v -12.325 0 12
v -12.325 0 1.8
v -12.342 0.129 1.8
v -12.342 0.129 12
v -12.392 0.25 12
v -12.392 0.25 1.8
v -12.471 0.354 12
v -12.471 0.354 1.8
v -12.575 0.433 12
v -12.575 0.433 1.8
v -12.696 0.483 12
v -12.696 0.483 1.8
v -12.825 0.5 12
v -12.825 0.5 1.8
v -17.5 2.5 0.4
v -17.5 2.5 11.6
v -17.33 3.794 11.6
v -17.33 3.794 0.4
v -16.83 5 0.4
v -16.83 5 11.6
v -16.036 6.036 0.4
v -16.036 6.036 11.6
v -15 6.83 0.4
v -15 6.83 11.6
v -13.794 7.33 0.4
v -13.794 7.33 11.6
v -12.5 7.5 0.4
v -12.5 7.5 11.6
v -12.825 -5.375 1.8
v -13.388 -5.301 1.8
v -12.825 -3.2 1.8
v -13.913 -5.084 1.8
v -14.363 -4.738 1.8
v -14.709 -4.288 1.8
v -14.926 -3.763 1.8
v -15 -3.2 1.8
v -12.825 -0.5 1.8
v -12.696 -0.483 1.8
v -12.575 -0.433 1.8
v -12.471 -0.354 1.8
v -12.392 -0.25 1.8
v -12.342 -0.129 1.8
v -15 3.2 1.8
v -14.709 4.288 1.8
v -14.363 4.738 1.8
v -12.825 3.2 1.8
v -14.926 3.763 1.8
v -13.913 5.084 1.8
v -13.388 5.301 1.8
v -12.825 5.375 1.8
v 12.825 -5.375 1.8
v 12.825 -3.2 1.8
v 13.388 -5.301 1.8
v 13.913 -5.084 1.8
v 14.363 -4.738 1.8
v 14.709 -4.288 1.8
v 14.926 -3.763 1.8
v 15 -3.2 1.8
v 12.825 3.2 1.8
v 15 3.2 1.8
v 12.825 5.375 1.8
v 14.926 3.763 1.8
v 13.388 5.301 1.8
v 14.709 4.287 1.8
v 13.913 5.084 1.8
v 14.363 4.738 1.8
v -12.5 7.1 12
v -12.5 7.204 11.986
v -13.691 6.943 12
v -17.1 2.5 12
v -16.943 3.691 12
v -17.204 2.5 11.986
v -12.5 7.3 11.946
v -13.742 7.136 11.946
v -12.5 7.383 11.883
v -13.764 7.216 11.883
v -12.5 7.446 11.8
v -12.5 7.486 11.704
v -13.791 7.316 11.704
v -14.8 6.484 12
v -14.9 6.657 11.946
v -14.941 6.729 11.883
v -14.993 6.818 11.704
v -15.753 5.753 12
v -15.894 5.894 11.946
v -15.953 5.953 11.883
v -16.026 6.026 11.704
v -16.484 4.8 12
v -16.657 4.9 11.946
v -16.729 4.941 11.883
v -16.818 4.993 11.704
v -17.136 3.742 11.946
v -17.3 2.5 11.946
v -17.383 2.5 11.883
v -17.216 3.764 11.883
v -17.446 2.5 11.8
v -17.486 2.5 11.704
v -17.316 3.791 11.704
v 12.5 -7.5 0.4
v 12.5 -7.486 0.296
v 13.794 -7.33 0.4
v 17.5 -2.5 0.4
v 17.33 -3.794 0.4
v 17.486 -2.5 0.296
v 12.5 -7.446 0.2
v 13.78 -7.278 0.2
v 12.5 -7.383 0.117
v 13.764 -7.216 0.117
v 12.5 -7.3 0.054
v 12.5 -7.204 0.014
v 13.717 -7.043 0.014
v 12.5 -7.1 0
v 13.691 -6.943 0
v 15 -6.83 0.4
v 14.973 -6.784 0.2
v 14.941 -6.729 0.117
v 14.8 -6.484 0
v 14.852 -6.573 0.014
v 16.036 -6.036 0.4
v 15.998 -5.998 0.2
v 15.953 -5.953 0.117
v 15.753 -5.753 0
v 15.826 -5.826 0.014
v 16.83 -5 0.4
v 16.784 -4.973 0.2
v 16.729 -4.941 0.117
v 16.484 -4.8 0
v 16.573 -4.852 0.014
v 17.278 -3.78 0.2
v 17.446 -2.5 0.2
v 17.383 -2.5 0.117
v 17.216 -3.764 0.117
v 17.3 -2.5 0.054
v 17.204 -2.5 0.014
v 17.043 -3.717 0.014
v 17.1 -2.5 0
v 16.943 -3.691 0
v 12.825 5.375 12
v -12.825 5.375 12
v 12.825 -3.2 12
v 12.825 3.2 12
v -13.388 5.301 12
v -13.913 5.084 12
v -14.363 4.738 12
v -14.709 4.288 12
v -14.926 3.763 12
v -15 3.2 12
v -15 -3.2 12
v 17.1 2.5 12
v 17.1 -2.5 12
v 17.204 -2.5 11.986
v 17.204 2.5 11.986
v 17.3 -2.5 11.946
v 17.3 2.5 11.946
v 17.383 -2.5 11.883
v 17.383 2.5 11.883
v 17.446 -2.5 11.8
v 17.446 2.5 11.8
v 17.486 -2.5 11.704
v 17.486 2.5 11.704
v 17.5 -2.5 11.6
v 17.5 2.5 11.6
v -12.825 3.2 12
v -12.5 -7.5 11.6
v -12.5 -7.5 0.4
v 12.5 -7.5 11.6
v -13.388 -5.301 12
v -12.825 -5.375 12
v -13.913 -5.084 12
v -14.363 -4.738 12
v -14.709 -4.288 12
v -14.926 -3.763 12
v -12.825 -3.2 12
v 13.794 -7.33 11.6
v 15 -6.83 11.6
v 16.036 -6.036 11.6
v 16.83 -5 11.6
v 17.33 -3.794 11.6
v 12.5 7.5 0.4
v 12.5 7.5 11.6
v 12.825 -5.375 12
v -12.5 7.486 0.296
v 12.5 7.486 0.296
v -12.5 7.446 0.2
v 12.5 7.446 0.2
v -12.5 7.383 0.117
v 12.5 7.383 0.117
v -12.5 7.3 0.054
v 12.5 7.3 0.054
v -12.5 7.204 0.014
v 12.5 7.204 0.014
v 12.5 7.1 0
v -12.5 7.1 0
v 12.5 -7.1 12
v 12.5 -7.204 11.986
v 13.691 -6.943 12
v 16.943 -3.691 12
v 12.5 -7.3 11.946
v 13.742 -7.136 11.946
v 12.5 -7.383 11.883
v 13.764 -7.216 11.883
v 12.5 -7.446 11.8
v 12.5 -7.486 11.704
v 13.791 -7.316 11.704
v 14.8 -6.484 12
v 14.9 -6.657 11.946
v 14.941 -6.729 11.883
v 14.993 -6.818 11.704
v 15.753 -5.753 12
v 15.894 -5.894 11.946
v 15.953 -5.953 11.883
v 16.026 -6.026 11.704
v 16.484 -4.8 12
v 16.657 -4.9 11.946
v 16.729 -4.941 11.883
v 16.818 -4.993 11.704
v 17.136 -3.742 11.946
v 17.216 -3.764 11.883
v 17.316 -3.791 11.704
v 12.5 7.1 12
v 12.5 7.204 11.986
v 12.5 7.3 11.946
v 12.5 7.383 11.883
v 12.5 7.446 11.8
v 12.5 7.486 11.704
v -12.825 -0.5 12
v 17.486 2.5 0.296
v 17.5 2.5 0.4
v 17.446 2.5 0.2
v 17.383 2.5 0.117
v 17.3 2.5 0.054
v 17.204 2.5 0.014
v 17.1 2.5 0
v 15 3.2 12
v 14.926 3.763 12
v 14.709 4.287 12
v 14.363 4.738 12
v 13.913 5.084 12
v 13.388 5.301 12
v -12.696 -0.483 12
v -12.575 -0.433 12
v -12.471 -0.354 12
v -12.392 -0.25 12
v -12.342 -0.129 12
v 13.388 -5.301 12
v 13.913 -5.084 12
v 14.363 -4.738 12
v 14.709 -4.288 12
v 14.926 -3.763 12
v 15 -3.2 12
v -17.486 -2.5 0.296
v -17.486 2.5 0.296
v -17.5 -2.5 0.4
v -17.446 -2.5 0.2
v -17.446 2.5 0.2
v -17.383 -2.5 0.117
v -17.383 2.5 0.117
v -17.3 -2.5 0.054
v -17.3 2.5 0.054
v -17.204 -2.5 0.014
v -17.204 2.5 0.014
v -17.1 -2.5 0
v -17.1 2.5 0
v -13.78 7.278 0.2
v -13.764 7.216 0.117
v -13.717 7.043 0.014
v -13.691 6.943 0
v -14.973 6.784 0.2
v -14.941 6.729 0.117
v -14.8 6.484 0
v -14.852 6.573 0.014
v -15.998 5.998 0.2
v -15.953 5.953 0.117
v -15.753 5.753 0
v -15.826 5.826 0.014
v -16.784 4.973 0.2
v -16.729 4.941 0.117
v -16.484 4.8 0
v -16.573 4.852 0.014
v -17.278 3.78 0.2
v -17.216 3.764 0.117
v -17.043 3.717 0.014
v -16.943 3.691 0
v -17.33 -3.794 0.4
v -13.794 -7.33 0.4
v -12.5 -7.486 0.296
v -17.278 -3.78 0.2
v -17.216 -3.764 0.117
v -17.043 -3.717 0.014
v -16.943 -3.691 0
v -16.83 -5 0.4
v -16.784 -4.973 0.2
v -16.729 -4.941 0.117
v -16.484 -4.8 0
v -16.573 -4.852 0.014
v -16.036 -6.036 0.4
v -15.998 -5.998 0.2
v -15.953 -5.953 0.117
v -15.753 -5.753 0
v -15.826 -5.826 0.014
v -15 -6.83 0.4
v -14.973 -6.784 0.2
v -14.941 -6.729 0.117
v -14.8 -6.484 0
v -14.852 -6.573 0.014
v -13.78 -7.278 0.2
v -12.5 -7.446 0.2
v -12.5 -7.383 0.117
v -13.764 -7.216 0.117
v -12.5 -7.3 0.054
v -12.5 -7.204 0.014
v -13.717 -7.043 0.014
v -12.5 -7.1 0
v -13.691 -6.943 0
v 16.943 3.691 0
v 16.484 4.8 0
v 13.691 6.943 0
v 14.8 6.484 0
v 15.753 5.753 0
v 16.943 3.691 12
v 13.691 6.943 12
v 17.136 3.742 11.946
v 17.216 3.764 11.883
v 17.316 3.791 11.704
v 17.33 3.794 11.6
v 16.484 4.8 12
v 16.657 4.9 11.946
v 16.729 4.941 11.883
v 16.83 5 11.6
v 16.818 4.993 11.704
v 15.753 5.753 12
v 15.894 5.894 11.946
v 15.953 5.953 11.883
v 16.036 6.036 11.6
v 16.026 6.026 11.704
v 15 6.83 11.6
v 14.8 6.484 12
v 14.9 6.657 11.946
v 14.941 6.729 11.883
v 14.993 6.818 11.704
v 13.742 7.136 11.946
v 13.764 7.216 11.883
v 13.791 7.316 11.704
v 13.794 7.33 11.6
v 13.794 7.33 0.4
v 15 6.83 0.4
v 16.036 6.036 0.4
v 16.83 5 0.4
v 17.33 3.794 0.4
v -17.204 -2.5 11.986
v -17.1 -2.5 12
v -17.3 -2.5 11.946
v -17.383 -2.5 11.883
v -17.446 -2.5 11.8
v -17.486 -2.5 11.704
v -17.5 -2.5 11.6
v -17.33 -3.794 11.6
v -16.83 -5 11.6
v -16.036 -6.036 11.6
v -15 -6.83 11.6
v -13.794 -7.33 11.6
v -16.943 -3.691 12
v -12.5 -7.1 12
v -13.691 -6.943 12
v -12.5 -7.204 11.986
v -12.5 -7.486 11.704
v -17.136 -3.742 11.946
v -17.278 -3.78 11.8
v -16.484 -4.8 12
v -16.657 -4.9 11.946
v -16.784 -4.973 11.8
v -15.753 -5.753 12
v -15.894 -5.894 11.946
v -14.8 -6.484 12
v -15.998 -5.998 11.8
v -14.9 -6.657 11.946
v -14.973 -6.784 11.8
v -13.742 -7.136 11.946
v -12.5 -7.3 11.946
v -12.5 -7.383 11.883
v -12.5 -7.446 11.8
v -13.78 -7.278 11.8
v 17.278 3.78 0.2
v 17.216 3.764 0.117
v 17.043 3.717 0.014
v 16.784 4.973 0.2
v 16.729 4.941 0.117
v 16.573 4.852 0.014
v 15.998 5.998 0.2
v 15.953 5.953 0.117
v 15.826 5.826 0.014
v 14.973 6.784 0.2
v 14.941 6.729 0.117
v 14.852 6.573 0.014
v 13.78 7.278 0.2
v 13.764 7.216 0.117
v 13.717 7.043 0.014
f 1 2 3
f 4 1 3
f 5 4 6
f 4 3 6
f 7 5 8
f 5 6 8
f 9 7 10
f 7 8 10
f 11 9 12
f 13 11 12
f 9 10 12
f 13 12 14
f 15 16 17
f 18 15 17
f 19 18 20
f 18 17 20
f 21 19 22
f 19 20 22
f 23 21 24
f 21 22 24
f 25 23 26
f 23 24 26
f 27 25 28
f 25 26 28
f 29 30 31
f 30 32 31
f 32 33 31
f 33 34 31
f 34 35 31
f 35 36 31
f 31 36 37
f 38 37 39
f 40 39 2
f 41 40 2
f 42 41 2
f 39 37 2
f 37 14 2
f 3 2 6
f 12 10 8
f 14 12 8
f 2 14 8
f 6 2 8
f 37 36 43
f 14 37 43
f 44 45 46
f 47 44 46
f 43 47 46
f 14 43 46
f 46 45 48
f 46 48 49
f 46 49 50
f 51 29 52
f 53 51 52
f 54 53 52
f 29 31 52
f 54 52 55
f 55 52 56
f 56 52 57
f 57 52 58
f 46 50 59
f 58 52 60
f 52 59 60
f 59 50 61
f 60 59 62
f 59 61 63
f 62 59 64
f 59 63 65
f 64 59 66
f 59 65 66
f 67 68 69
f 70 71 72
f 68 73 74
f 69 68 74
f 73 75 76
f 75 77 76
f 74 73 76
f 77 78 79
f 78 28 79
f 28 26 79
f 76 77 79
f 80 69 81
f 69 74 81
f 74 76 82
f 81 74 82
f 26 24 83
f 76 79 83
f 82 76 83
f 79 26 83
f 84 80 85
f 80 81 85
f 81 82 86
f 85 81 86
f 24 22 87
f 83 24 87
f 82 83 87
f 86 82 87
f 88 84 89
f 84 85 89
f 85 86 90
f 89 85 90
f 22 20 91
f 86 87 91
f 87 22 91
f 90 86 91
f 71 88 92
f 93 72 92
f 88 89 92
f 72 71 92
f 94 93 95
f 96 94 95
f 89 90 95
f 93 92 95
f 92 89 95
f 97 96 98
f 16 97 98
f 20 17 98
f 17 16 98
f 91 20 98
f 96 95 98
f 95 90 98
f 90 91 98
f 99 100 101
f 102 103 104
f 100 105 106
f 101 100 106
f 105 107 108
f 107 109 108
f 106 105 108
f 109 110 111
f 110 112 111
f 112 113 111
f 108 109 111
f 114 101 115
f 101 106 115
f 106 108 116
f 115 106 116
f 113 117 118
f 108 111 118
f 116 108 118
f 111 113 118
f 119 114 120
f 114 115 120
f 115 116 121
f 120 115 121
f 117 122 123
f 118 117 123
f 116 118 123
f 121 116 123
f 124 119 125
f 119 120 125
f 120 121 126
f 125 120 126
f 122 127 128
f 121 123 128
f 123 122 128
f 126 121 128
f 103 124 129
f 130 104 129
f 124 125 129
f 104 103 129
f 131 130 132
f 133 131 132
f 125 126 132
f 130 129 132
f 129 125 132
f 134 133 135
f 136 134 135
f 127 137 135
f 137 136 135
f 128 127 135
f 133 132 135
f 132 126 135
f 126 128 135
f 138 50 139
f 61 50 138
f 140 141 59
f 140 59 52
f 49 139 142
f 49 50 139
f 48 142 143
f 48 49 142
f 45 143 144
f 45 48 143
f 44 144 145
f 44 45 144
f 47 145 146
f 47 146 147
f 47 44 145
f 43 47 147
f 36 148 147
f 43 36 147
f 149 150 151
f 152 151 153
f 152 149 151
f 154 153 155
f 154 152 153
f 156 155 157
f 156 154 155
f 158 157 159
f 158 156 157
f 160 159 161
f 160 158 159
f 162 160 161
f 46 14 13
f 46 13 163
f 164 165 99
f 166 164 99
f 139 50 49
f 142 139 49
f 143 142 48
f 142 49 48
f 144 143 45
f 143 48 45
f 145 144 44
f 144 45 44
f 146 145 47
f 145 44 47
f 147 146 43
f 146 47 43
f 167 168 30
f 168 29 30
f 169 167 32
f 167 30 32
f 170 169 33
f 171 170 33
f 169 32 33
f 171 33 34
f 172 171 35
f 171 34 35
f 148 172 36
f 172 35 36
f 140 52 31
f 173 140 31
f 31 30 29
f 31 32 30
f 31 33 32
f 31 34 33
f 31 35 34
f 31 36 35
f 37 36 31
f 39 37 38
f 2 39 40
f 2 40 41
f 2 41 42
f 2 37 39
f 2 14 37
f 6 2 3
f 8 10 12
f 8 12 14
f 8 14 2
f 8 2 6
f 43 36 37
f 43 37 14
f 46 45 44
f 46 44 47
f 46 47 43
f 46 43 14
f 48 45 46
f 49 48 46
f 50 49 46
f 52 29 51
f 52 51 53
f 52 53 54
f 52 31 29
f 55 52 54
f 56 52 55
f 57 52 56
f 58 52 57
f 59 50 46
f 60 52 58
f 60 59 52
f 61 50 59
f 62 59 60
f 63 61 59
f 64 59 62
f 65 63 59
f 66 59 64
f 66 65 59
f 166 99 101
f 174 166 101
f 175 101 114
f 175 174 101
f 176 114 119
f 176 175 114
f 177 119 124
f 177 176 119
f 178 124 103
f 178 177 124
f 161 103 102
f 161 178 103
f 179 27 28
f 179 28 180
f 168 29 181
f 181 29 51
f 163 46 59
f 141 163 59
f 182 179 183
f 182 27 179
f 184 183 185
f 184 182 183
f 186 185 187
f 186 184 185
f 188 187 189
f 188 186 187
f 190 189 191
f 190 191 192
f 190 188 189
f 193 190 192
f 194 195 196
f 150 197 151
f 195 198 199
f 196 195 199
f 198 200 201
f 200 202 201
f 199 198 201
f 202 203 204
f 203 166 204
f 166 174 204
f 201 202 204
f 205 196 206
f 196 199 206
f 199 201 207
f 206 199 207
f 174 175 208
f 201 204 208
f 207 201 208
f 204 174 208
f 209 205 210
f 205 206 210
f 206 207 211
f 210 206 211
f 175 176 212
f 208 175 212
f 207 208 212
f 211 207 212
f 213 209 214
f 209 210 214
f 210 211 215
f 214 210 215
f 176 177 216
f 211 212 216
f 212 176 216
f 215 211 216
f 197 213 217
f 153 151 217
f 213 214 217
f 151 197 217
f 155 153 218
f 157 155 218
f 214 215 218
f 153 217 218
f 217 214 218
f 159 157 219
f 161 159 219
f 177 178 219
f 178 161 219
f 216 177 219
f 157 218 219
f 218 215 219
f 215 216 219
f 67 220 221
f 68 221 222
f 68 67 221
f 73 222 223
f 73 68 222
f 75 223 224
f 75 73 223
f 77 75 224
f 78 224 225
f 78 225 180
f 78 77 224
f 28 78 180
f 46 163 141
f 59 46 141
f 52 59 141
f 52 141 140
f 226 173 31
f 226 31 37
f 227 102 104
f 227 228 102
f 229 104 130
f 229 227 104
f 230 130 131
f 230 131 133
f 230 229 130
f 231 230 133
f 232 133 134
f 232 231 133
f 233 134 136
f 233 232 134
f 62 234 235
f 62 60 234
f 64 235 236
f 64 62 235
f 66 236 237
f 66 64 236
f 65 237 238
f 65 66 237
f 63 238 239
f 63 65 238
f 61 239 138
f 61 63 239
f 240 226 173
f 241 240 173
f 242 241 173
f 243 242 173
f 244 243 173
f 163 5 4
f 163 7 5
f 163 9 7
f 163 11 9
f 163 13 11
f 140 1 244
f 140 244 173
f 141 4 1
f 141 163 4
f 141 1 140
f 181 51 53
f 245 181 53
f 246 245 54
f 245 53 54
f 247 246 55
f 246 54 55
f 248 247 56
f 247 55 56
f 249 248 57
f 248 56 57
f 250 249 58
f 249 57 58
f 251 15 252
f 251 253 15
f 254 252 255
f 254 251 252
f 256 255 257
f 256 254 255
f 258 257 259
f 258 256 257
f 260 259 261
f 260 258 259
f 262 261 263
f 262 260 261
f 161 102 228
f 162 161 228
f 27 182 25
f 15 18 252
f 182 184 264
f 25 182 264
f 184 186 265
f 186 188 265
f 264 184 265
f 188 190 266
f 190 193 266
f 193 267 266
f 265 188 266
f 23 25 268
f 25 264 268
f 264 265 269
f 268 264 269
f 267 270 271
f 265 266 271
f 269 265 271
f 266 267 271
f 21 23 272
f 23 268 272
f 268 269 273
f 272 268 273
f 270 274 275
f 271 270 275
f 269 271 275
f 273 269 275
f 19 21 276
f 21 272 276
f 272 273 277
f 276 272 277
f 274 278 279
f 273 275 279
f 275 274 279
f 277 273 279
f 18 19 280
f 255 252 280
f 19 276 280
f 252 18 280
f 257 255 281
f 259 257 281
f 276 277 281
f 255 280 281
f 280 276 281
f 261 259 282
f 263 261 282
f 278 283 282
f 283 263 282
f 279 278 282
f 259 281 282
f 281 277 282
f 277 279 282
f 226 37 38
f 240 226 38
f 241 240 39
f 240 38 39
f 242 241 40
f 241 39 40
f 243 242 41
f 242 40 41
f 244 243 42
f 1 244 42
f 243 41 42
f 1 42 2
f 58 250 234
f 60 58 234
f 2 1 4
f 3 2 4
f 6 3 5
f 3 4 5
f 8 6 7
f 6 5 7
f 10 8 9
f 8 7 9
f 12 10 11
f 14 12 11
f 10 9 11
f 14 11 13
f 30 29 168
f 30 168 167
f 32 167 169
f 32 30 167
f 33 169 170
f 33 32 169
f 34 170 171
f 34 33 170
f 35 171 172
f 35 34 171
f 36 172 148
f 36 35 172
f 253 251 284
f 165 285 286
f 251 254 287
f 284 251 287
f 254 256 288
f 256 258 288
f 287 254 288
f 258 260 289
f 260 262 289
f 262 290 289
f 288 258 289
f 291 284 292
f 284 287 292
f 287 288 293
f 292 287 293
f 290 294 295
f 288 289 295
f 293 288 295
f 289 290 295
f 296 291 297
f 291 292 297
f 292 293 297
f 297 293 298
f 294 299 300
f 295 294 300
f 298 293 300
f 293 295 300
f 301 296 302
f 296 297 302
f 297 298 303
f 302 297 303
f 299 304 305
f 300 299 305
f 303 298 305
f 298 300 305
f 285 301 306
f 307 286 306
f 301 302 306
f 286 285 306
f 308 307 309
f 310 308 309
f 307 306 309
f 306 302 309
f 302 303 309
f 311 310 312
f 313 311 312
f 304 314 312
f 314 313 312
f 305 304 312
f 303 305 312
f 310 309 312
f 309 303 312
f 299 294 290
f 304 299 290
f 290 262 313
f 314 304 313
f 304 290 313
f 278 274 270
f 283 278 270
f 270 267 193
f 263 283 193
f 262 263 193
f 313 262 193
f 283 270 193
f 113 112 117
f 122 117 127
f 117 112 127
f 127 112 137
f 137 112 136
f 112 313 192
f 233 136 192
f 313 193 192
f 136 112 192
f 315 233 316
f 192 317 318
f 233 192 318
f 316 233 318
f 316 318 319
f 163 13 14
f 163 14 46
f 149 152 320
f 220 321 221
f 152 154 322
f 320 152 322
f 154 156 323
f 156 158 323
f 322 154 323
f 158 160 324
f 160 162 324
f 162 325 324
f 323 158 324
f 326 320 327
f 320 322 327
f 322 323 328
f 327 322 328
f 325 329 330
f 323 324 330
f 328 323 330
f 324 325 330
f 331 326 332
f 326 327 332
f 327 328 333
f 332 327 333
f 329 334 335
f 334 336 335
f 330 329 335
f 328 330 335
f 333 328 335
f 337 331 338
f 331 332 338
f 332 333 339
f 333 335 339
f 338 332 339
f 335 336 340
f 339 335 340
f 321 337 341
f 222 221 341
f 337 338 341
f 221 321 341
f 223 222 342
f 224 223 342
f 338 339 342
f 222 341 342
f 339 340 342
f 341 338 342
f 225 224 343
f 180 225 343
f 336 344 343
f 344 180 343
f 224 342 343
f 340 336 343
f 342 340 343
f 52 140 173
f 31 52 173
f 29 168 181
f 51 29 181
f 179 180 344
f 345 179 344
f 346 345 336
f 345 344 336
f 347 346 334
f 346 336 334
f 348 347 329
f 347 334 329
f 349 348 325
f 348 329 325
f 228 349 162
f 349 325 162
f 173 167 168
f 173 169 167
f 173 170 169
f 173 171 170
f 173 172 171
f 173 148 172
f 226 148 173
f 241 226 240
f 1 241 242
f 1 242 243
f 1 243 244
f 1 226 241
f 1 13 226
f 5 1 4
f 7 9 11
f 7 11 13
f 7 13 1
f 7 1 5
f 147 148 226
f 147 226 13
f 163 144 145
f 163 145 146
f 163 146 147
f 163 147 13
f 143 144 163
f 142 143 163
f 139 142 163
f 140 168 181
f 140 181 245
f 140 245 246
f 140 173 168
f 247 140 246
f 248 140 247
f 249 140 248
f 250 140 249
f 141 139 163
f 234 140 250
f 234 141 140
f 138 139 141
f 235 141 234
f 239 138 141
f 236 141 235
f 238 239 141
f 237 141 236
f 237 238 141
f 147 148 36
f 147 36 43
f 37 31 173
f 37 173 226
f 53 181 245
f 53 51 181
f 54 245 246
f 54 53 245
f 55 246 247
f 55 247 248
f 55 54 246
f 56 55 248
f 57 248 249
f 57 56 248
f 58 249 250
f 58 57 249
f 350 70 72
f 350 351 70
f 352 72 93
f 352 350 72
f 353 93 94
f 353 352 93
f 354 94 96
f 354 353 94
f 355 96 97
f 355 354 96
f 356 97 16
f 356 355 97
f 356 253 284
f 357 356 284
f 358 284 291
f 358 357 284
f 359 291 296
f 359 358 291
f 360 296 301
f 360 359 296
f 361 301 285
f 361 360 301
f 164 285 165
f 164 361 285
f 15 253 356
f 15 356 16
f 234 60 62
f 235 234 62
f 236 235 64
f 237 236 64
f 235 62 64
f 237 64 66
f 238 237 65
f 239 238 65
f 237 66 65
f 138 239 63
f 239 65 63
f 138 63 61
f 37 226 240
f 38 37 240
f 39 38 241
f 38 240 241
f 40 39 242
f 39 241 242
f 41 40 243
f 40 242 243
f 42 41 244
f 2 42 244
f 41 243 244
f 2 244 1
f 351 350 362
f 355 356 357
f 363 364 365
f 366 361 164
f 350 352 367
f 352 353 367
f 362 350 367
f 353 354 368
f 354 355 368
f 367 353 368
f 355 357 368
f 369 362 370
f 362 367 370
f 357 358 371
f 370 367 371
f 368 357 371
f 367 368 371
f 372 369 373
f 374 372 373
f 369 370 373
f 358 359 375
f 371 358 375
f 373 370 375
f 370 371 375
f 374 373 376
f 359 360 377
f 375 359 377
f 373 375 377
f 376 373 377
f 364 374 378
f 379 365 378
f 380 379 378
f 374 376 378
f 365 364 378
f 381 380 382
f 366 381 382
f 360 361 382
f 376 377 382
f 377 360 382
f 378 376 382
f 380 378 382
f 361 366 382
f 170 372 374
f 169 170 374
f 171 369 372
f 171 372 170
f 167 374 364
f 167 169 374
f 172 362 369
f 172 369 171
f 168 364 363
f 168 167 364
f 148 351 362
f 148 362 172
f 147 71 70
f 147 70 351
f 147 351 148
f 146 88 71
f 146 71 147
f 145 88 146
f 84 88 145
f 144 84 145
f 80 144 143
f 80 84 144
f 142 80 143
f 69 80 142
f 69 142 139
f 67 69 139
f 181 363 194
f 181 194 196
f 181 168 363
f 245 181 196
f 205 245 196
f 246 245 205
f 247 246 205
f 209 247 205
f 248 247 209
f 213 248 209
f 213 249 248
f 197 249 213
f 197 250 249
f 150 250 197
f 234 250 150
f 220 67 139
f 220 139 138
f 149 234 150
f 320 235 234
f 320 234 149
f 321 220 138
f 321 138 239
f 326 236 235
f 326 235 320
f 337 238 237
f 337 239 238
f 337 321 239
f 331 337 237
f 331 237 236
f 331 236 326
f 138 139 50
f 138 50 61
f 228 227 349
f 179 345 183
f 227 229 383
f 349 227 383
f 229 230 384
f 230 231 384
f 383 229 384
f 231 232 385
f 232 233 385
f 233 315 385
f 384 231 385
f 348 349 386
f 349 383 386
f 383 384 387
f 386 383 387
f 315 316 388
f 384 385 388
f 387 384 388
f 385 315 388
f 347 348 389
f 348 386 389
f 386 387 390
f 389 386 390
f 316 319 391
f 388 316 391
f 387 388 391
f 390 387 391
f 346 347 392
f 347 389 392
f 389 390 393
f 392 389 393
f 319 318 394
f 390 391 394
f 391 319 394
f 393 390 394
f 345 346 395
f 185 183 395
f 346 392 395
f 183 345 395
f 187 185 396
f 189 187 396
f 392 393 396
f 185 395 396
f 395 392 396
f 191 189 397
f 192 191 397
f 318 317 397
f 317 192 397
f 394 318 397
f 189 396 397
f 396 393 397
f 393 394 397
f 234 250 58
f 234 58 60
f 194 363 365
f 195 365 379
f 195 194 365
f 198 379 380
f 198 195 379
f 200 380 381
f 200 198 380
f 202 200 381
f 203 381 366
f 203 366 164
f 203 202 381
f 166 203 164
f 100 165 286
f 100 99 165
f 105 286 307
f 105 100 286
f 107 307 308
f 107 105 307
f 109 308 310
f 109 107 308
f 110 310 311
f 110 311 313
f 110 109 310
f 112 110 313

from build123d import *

# Parameters (mm, degrees)
F0_W     = 35
F0_H     = 15
F1_DEPTH = 12
F2_W     = 30
F2_H     = 10.75
F3_DEPTH = 10.2
F4_R     = 2.175
F5_R     = 5
F6_R     = 0.4
F7_DEPTH = 10.2


with BuildPart() as f1:
    # F0 (on Top) → F1 (new body)
    with BuildSketch(Plane.XY):
        Rectangle(F0_W, F0_H)
    extrude(amount=F1_DEPTH)

    # F2 (on face) → F3 (cut)
    with BuildSketch(Plane.XY.offset(12)):
        Rectangle(F2_W, F2_H)
        with BuildLine():
            Line((12.825, 3.2), (12.825, -3.2))
            Line((12.825, -3.2), (-12.825, -3.2))
            Line((-12.825, -3.2), (-12.825, -0.5))
            ThreePointArc((-12.825, -0.5), (-13.325, 0), (-12.825, 0.5))
            Line((-12.825, 0.5), (-12.825, 3.2))
            Line((-12.825, 3.2), (12.825, 3.2))
        make_face(mode=Mode.SUBTRACT)
        with BuildLine():
            ThreePointArc((-12.825, 0.5), (-13.325, 0), (-12.825, -0.5))
            Line((-12.825, -0.5), (-12.825, 0.5))
        make_face()
        with BuildLine():
            Line((-12.825, 0.5), (-12.825, -0.5))
            ThreePointArc((-12.825, -0.5), (-12.4714466094, -0.3535533906), (-12.325, 0))
            ThreePointArc((-12.325, 0), (-12.4714466094, 0.3535533906), (-12.825, 0.5))
        make_face()
    extrude(amount=-F3_DEPTH, mode=Mode.SUBTRACT)

    # F4
    f4_edges = [f1.edges().sort_by_distance(p)[0] for p in [
        (-15, 5.375, 6.9),
        (15, 5.375, 6.9),
        (15, -5.375, 6.9),
        (-15, -5.375, 6.9),
    ]]
    fillet(f4_edges, radius=F4_R)

    # F5
    f5_edges = [f1.edges().sort_by_distance(p)[0] for p in [
        (-17.5, 7.5, 6),
        (-17.5, -7.5, 6),
        (17.5, 7.5, 6),
        (17.5, -7.5, 6),
    ]]
    fillet(f5_edges, radius=F5_R)

    # F6
    f6_edges = [f1.edges().sort_by_distance(p)[0] for p in [
        (0, -7.5, 0),
        (-16.035534, -6.035534, 0),
        (16.035534, -6.035534, 0),
        (-17.5, 0, 0),
        (17.5, 0, 0),
        (-16.035534, 6.035534, 0),
        (16.035534, 6.035534, 0),
        (0, 7.5, 0),
        (-16.035534, -6.035534, 12),
    ]]
    fillet(f6_edges, radius=F6_R)


with BuildPart() as f7:
    # F7 (new): a face of the model
    f7_faces = [f1.part.faces().sort_by_distance(p)[0] for p in [
        (0, -5.0563210864, 1.8),
    ]]
    extrude(f7_faces, amount=F7_DEPTH)


solid = Compound([f1.part, f7.part])
